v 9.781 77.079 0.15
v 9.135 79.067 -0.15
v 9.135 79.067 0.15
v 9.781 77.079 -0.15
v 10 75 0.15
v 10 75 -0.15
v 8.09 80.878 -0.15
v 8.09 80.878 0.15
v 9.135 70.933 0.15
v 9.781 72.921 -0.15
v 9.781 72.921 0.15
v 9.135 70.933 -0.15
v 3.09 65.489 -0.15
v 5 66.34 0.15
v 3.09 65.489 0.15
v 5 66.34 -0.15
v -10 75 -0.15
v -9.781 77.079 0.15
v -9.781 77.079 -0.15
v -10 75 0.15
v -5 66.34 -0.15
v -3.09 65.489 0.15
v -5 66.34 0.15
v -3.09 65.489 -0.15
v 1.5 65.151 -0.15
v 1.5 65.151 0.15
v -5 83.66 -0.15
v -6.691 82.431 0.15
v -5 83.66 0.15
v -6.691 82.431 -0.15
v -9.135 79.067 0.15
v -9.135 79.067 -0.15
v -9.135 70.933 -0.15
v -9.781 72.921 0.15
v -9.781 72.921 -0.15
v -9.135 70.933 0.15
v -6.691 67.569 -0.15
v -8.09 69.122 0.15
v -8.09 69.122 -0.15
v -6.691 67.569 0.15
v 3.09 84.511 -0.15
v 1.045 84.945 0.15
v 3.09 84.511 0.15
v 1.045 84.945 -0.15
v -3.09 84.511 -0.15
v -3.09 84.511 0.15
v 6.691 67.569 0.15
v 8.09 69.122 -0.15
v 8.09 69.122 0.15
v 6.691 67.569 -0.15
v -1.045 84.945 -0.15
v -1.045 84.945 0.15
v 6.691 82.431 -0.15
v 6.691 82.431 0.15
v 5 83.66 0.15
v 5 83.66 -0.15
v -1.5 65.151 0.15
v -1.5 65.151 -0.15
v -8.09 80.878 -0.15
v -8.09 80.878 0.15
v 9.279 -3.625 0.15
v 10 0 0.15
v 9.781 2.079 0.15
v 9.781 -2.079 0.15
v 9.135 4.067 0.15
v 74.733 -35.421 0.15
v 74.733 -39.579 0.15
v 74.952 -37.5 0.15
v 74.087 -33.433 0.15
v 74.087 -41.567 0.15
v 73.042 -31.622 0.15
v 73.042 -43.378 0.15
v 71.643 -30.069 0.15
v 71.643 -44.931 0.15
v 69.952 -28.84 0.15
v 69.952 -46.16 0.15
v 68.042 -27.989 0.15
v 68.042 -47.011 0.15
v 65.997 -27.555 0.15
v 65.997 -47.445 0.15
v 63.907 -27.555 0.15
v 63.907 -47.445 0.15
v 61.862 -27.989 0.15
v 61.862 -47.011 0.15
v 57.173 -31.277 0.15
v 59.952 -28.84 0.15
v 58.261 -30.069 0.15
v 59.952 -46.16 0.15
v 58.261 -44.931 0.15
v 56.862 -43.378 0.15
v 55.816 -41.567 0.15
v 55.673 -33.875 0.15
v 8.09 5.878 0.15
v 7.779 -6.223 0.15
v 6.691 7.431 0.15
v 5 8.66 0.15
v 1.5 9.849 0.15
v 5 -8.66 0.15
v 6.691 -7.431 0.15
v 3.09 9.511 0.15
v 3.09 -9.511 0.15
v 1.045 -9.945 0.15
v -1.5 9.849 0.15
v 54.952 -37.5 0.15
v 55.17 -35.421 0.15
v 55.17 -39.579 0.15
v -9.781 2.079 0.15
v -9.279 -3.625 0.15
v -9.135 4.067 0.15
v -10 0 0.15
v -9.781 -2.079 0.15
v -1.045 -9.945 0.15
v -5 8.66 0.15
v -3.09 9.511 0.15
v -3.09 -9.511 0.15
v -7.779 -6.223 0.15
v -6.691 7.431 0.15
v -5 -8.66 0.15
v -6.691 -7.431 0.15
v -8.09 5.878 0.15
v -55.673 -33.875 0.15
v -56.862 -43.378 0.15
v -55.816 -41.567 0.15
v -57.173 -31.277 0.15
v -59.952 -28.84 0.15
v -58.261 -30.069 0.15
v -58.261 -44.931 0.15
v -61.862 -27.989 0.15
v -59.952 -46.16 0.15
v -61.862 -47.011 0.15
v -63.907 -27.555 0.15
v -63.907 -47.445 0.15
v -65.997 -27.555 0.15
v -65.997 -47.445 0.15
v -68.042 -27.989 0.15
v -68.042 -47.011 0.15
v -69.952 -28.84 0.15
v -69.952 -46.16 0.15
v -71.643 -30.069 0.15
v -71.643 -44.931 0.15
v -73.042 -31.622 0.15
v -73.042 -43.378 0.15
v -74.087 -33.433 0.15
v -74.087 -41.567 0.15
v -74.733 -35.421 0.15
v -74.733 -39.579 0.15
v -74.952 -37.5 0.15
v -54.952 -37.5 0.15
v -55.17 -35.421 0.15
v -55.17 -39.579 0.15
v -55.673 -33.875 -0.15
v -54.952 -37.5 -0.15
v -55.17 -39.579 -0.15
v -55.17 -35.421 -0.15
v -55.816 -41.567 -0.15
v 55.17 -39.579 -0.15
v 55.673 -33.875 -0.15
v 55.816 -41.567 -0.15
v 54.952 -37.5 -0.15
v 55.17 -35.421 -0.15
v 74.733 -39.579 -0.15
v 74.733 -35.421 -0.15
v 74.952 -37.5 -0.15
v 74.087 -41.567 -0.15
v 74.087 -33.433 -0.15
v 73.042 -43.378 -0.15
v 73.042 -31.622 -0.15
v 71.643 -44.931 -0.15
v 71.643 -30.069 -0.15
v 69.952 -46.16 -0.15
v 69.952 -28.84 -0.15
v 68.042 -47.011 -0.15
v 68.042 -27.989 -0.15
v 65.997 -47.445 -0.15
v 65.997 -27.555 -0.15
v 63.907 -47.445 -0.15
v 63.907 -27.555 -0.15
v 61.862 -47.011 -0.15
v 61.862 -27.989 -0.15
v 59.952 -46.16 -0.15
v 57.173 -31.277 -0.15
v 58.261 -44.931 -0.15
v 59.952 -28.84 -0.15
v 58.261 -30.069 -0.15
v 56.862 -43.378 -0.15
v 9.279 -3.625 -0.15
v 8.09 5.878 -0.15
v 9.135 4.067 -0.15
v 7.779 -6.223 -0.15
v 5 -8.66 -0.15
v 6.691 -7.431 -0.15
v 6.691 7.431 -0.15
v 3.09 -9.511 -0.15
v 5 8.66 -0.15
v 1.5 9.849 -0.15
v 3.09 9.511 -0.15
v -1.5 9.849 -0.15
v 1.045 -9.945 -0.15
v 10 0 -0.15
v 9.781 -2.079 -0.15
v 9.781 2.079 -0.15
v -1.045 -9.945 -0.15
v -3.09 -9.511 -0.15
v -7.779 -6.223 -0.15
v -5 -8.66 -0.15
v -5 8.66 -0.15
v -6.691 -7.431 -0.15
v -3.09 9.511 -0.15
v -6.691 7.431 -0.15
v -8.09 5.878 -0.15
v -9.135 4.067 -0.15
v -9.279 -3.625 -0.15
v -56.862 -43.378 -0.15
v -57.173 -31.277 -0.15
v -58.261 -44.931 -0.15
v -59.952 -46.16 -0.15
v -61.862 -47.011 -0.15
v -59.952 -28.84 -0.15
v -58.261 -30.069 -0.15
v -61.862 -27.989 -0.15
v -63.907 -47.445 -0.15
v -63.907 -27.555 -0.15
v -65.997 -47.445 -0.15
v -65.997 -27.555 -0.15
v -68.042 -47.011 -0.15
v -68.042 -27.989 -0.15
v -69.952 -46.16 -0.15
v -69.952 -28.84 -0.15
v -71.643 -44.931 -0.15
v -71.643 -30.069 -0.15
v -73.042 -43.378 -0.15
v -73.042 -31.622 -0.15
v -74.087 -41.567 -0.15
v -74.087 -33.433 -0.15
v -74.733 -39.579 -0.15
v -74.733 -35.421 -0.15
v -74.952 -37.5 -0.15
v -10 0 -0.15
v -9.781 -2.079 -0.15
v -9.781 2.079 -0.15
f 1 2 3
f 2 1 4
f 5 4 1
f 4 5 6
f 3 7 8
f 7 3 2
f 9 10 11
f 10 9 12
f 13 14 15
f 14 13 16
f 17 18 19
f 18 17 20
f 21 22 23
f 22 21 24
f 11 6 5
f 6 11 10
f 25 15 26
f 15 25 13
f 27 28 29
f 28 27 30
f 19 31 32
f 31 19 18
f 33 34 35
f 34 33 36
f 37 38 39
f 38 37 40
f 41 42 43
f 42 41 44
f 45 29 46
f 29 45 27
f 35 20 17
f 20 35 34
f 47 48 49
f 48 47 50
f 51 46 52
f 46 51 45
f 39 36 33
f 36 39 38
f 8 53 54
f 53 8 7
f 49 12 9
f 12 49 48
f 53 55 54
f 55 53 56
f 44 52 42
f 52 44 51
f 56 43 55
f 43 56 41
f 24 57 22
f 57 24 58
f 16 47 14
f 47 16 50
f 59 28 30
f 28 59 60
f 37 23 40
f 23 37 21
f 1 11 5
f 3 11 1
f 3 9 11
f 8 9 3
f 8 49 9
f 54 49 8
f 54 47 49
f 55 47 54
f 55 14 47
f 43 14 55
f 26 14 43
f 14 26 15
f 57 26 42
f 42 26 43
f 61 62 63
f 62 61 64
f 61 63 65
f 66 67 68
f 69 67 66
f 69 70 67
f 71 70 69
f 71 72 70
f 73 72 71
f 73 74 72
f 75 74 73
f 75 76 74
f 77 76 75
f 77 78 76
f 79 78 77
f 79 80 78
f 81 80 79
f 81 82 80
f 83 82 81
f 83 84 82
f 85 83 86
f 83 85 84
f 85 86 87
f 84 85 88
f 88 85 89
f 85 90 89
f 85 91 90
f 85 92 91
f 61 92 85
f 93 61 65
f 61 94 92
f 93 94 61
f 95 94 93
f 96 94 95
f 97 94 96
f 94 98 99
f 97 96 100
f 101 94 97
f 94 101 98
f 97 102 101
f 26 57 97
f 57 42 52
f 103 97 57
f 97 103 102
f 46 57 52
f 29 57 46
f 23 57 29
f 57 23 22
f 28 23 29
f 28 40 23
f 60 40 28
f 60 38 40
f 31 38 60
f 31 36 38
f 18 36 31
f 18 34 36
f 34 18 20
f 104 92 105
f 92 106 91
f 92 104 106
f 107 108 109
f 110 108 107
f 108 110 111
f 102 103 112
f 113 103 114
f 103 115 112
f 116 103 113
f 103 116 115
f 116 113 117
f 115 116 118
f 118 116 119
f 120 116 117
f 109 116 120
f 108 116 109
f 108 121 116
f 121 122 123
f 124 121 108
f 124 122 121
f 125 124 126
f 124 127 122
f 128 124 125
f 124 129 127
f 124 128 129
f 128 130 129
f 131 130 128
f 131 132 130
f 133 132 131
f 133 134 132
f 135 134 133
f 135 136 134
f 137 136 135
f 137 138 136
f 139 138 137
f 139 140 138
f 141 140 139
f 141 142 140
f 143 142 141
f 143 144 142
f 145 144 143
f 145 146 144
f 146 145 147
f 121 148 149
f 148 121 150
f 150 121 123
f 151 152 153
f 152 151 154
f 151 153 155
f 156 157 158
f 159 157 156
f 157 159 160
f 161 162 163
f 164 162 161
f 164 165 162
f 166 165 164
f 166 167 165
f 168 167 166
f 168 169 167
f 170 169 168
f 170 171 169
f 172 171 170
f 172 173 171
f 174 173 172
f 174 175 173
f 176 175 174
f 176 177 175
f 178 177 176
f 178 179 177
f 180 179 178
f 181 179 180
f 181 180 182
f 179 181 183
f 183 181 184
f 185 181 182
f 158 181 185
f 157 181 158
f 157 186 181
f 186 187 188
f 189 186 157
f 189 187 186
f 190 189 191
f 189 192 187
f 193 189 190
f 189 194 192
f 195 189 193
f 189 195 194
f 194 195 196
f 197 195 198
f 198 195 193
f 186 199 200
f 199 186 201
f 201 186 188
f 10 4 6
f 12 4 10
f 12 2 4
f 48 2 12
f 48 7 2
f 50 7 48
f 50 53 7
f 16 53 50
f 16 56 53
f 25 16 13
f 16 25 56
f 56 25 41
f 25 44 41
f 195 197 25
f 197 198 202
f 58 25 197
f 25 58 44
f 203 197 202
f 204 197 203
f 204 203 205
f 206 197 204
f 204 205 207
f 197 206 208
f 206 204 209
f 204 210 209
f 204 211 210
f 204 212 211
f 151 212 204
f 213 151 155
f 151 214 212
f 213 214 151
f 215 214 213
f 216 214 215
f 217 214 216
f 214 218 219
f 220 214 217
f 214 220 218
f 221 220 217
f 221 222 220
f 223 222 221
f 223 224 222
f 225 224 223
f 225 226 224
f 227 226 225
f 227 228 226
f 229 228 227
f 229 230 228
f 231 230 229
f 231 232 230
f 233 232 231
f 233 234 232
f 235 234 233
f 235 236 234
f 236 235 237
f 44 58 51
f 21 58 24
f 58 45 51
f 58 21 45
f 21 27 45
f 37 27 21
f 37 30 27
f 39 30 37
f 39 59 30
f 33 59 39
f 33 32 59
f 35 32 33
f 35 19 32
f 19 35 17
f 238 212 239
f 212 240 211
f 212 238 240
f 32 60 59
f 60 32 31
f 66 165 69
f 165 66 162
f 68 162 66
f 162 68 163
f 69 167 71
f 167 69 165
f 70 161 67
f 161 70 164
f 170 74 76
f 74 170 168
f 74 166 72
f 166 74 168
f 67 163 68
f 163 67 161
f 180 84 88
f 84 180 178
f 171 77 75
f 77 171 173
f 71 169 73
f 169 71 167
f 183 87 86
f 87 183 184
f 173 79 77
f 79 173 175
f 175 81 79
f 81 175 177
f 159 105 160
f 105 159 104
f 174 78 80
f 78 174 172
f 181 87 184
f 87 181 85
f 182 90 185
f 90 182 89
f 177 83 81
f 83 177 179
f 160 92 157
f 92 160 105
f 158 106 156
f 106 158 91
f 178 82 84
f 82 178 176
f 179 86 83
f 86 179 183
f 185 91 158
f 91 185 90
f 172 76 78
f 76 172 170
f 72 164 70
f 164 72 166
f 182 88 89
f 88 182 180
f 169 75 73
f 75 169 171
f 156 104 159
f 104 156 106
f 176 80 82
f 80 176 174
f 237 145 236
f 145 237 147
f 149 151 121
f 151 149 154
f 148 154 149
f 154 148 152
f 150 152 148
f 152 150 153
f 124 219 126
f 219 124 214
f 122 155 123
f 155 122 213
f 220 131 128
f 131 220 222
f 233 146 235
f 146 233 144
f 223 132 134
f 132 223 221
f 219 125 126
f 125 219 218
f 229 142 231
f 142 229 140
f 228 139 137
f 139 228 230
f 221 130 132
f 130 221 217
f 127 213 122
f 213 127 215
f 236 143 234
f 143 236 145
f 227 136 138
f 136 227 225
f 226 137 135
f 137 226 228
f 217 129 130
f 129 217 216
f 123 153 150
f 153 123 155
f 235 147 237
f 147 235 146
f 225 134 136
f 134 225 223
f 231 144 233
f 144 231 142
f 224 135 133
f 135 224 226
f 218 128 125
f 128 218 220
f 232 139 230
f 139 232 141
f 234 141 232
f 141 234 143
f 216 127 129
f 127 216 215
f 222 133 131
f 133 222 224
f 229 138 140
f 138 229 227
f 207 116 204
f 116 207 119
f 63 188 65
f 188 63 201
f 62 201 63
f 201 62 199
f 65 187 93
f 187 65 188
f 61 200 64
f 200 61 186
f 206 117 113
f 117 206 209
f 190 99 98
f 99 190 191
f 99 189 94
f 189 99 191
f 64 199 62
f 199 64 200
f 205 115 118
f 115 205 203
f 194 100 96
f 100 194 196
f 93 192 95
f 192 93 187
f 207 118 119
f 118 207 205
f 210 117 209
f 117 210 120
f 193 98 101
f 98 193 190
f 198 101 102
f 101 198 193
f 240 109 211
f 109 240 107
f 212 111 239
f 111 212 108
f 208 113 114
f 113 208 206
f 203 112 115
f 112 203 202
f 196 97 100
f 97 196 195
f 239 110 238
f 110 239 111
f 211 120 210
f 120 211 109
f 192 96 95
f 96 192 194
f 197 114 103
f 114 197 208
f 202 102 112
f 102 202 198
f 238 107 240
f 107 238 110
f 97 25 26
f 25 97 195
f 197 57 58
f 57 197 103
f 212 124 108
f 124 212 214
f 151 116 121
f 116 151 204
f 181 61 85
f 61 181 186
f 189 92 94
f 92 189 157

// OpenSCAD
/* [Size] */
size = 170; //[1:500]

circle_diameter = 20; //[1:50]

module fourPoint1stLayerPrintTest()
{
    rsize = circle_diameter/2;
    xpos= size/2 - rsize;
    ypos = size/2 - rsize;
    
    union() {
        translate([0,ypos,0]){
              cylinder(r=rsize, h=0.3, center = true);
        }
        translate([cos(30)*xpos,-sin(30)*ypos,0]){
              cylinder(r=rsize, h=0.3, center = true);
        }
        translate([-cos(30)*xpos,-sin(30)*ypos,0]){
              cylinder(r=rsize, h=0.3, center = true);
        }
        cylinder(r=rsize, h=0.3, center = true);
        
        translate([0,ypos/2,0]){
              cube([3, size/2, 0.3], center = true);
        }
        translate([-cos(30)*xpos/2,-sin(30)*ypos/2,0]){
            rotate([0,0,30])
                cube([size/2, 3, 0.3], center = true);
        }
        translate([cos(30)*xpos/2, -sin(30)*ypos/2, 0]){
            rotate([0,0,-30])
                cube([size/2, 3, 0.3], center = true);
        }

    }
    
}

fourPoint1stLayerPrintTest();
